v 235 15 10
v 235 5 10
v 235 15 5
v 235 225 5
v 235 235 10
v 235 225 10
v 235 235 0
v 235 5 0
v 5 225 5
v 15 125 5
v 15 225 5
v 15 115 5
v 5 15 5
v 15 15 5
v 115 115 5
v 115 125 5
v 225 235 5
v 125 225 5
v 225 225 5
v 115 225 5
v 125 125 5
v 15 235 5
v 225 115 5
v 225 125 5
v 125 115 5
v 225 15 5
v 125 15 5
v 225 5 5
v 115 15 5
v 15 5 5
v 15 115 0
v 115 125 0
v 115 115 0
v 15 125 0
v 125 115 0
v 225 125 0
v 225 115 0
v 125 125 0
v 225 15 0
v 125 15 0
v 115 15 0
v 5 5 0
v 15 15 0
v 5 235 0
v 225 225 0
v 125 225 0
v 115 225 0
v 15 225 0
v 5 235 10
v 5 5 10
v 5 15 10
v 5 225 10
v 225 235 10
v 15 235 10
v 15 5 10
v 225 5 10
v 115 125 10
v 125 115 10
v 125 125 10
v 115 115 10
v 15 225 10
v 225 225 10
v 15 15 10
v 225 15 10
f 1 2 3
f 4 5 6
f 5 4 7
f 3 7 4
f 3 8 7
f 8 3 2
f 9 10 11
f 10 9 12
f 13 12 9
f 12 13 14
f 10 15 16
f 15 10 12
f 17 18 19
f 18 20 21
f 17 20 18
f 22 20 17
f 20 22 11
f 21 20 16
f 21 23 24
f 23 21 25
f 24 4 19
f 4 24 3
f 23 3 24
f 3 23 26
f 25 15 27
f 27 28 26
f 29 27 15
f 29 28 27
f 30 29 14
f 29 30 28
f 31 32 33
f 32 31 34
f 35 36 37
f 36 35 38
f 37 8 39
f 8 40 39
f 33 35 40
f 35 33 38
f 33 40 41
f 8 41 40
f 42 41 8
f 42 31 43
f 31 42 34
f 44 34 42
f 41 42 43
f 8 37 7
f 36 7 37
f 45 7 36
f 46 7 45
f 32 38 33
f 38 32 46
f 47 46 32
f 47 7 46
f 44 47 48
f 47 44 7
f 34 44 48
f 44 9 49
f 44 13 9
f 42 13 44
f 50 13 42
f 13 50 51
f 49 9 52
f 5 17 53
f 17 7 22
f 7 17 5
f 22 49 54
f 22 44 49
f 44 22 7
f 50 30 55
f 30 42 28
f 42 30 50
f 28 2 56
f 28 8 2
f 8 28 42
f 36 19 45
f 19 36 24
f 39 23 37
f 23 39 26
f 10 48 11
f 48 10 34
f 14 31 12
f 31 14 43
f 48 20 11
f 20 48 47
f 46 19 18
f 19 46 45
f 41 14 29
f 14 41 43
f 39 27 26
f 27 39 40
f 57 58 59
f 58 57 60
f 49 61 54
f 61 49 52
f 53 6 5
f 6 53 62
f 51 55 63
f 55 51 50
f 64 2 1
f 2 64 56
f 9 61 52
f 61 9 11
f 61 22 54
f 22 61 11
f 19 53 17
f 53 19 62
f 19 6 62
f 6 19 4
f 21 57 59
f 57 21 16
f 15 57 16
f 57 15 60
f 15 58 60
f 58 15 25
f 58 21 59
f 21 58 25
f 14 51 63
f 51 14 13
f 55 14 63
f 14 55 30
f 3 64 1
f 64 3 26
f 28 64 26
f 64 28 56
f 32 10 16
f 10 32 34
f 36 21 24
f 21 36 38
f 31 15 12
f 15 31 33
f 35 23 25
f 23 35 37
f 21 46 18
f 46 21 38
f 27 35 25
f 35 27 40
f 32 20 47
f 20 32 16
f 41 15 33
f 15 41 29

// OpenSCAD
// for SDSMT 3DPC geomap project by Dustin Richards, 2021-5

// ------ INPUT PARAMETERS ------

supertile_x = 3; // # of tiles in the width of a supertile
supertile_y = 3; // # of tiles in the height of a supertile

x_size  = 80 * supertile_x; // output model x side length, mm
y_size  = 80 * supertile_y; // output model y side length, mm

// a single 0.1mm layer for 3m of z data
z_mm_per_m = 0.1 / 3; // how many scale model mm correspond to a real-world m

leg_height_base = 10; // minimum leg height, mm
tile_min_elev = 0; // minimum normalized elevation found in the supertile, used to calculate leg_height_comp

leg_xy_size = 10;     // horizontal edge length of legs

leg_offset = 10;  // distance from center of leg to edge of tile, must be at least half of leg_xy_size
strut_height = 5; // thickness of the members that connect the legs together

// ------ END INPUT PARAMETERS ------

// leg height 
leg_height_comp = tile_min_elev * z_mm_per_m;  // leg height added on to base to compensate for tile heights
leg_height = leg_height_base + leg_height_comp;  // overall height of legs, including struts

// locations of legs
leg_gap  = leg_offset - (leg_xy_size/2); // gap between outer edge of leg and edge of supertile
leg1_loc = [leg_offset, y_size-leg_offset, 0];        // top left
leg2_loc = [x_size-leg_offset, y_size-leg_offset, 0]; // top right
leg3_loc = [leg_offset, leg_offset, 0];               // bottom left
leg4_loc = [x_size-leg_offset, leg_offset, 0];        // bottom right
leg5_loc = [x_size/2, y_size/2, 0];                   // middle
leg_locs = [leg1_loc, leg2_loc, leg3_loc, leg4_loc, leg5_loc];

// offset and size for the outer dimension of the struts
strut_outer_offset = [leg_gap, leg_gap, 0];
strut_outer_size = [x_size - (leg_gap*2), y_size - (leg_gap*2), strut_height];

// offset and size for the inner dimension of the struts, used to make a cut
strut_inner_offset = [
  strut_outer_offset[0] + leg_xy_size,
  strut_outer_offset[1] + leg_xy_size,
  0];
strut_inner_size = [
  strut_outer_size[0] - (leg_xy_size*2),
  strut_outer_size[1] - (leg_xy_size*2),
  strut_height];
  
module legs() {
  union() {
    // extrude each leg
    linear_extrude(leg_height) {
      for(i = [0:4])
        translate(leg_locs[i])
          square(leg_xy_size, true);
    }
    
    // make the outer struts
    difference() {
      translate(strut_outer_offset)
        cube(strut_outer_size);
      
      translate(strut_inner_offset)
        cube(strut_inner_size);
    }
    
    // struts for the middle leg
    translate([leg_gap, leg5_loc[1] - (leg_xy_size/2), 0])
      cube([strut_outer_size[0], leg_xy_size, strut_height]);
    translate([leg5_loc[1] - (leg_xy_size/2), leg_gap, 0])
      cube([leg_xy_size, strut_outer_size[1], strut_height]);
  }
}

legs();
